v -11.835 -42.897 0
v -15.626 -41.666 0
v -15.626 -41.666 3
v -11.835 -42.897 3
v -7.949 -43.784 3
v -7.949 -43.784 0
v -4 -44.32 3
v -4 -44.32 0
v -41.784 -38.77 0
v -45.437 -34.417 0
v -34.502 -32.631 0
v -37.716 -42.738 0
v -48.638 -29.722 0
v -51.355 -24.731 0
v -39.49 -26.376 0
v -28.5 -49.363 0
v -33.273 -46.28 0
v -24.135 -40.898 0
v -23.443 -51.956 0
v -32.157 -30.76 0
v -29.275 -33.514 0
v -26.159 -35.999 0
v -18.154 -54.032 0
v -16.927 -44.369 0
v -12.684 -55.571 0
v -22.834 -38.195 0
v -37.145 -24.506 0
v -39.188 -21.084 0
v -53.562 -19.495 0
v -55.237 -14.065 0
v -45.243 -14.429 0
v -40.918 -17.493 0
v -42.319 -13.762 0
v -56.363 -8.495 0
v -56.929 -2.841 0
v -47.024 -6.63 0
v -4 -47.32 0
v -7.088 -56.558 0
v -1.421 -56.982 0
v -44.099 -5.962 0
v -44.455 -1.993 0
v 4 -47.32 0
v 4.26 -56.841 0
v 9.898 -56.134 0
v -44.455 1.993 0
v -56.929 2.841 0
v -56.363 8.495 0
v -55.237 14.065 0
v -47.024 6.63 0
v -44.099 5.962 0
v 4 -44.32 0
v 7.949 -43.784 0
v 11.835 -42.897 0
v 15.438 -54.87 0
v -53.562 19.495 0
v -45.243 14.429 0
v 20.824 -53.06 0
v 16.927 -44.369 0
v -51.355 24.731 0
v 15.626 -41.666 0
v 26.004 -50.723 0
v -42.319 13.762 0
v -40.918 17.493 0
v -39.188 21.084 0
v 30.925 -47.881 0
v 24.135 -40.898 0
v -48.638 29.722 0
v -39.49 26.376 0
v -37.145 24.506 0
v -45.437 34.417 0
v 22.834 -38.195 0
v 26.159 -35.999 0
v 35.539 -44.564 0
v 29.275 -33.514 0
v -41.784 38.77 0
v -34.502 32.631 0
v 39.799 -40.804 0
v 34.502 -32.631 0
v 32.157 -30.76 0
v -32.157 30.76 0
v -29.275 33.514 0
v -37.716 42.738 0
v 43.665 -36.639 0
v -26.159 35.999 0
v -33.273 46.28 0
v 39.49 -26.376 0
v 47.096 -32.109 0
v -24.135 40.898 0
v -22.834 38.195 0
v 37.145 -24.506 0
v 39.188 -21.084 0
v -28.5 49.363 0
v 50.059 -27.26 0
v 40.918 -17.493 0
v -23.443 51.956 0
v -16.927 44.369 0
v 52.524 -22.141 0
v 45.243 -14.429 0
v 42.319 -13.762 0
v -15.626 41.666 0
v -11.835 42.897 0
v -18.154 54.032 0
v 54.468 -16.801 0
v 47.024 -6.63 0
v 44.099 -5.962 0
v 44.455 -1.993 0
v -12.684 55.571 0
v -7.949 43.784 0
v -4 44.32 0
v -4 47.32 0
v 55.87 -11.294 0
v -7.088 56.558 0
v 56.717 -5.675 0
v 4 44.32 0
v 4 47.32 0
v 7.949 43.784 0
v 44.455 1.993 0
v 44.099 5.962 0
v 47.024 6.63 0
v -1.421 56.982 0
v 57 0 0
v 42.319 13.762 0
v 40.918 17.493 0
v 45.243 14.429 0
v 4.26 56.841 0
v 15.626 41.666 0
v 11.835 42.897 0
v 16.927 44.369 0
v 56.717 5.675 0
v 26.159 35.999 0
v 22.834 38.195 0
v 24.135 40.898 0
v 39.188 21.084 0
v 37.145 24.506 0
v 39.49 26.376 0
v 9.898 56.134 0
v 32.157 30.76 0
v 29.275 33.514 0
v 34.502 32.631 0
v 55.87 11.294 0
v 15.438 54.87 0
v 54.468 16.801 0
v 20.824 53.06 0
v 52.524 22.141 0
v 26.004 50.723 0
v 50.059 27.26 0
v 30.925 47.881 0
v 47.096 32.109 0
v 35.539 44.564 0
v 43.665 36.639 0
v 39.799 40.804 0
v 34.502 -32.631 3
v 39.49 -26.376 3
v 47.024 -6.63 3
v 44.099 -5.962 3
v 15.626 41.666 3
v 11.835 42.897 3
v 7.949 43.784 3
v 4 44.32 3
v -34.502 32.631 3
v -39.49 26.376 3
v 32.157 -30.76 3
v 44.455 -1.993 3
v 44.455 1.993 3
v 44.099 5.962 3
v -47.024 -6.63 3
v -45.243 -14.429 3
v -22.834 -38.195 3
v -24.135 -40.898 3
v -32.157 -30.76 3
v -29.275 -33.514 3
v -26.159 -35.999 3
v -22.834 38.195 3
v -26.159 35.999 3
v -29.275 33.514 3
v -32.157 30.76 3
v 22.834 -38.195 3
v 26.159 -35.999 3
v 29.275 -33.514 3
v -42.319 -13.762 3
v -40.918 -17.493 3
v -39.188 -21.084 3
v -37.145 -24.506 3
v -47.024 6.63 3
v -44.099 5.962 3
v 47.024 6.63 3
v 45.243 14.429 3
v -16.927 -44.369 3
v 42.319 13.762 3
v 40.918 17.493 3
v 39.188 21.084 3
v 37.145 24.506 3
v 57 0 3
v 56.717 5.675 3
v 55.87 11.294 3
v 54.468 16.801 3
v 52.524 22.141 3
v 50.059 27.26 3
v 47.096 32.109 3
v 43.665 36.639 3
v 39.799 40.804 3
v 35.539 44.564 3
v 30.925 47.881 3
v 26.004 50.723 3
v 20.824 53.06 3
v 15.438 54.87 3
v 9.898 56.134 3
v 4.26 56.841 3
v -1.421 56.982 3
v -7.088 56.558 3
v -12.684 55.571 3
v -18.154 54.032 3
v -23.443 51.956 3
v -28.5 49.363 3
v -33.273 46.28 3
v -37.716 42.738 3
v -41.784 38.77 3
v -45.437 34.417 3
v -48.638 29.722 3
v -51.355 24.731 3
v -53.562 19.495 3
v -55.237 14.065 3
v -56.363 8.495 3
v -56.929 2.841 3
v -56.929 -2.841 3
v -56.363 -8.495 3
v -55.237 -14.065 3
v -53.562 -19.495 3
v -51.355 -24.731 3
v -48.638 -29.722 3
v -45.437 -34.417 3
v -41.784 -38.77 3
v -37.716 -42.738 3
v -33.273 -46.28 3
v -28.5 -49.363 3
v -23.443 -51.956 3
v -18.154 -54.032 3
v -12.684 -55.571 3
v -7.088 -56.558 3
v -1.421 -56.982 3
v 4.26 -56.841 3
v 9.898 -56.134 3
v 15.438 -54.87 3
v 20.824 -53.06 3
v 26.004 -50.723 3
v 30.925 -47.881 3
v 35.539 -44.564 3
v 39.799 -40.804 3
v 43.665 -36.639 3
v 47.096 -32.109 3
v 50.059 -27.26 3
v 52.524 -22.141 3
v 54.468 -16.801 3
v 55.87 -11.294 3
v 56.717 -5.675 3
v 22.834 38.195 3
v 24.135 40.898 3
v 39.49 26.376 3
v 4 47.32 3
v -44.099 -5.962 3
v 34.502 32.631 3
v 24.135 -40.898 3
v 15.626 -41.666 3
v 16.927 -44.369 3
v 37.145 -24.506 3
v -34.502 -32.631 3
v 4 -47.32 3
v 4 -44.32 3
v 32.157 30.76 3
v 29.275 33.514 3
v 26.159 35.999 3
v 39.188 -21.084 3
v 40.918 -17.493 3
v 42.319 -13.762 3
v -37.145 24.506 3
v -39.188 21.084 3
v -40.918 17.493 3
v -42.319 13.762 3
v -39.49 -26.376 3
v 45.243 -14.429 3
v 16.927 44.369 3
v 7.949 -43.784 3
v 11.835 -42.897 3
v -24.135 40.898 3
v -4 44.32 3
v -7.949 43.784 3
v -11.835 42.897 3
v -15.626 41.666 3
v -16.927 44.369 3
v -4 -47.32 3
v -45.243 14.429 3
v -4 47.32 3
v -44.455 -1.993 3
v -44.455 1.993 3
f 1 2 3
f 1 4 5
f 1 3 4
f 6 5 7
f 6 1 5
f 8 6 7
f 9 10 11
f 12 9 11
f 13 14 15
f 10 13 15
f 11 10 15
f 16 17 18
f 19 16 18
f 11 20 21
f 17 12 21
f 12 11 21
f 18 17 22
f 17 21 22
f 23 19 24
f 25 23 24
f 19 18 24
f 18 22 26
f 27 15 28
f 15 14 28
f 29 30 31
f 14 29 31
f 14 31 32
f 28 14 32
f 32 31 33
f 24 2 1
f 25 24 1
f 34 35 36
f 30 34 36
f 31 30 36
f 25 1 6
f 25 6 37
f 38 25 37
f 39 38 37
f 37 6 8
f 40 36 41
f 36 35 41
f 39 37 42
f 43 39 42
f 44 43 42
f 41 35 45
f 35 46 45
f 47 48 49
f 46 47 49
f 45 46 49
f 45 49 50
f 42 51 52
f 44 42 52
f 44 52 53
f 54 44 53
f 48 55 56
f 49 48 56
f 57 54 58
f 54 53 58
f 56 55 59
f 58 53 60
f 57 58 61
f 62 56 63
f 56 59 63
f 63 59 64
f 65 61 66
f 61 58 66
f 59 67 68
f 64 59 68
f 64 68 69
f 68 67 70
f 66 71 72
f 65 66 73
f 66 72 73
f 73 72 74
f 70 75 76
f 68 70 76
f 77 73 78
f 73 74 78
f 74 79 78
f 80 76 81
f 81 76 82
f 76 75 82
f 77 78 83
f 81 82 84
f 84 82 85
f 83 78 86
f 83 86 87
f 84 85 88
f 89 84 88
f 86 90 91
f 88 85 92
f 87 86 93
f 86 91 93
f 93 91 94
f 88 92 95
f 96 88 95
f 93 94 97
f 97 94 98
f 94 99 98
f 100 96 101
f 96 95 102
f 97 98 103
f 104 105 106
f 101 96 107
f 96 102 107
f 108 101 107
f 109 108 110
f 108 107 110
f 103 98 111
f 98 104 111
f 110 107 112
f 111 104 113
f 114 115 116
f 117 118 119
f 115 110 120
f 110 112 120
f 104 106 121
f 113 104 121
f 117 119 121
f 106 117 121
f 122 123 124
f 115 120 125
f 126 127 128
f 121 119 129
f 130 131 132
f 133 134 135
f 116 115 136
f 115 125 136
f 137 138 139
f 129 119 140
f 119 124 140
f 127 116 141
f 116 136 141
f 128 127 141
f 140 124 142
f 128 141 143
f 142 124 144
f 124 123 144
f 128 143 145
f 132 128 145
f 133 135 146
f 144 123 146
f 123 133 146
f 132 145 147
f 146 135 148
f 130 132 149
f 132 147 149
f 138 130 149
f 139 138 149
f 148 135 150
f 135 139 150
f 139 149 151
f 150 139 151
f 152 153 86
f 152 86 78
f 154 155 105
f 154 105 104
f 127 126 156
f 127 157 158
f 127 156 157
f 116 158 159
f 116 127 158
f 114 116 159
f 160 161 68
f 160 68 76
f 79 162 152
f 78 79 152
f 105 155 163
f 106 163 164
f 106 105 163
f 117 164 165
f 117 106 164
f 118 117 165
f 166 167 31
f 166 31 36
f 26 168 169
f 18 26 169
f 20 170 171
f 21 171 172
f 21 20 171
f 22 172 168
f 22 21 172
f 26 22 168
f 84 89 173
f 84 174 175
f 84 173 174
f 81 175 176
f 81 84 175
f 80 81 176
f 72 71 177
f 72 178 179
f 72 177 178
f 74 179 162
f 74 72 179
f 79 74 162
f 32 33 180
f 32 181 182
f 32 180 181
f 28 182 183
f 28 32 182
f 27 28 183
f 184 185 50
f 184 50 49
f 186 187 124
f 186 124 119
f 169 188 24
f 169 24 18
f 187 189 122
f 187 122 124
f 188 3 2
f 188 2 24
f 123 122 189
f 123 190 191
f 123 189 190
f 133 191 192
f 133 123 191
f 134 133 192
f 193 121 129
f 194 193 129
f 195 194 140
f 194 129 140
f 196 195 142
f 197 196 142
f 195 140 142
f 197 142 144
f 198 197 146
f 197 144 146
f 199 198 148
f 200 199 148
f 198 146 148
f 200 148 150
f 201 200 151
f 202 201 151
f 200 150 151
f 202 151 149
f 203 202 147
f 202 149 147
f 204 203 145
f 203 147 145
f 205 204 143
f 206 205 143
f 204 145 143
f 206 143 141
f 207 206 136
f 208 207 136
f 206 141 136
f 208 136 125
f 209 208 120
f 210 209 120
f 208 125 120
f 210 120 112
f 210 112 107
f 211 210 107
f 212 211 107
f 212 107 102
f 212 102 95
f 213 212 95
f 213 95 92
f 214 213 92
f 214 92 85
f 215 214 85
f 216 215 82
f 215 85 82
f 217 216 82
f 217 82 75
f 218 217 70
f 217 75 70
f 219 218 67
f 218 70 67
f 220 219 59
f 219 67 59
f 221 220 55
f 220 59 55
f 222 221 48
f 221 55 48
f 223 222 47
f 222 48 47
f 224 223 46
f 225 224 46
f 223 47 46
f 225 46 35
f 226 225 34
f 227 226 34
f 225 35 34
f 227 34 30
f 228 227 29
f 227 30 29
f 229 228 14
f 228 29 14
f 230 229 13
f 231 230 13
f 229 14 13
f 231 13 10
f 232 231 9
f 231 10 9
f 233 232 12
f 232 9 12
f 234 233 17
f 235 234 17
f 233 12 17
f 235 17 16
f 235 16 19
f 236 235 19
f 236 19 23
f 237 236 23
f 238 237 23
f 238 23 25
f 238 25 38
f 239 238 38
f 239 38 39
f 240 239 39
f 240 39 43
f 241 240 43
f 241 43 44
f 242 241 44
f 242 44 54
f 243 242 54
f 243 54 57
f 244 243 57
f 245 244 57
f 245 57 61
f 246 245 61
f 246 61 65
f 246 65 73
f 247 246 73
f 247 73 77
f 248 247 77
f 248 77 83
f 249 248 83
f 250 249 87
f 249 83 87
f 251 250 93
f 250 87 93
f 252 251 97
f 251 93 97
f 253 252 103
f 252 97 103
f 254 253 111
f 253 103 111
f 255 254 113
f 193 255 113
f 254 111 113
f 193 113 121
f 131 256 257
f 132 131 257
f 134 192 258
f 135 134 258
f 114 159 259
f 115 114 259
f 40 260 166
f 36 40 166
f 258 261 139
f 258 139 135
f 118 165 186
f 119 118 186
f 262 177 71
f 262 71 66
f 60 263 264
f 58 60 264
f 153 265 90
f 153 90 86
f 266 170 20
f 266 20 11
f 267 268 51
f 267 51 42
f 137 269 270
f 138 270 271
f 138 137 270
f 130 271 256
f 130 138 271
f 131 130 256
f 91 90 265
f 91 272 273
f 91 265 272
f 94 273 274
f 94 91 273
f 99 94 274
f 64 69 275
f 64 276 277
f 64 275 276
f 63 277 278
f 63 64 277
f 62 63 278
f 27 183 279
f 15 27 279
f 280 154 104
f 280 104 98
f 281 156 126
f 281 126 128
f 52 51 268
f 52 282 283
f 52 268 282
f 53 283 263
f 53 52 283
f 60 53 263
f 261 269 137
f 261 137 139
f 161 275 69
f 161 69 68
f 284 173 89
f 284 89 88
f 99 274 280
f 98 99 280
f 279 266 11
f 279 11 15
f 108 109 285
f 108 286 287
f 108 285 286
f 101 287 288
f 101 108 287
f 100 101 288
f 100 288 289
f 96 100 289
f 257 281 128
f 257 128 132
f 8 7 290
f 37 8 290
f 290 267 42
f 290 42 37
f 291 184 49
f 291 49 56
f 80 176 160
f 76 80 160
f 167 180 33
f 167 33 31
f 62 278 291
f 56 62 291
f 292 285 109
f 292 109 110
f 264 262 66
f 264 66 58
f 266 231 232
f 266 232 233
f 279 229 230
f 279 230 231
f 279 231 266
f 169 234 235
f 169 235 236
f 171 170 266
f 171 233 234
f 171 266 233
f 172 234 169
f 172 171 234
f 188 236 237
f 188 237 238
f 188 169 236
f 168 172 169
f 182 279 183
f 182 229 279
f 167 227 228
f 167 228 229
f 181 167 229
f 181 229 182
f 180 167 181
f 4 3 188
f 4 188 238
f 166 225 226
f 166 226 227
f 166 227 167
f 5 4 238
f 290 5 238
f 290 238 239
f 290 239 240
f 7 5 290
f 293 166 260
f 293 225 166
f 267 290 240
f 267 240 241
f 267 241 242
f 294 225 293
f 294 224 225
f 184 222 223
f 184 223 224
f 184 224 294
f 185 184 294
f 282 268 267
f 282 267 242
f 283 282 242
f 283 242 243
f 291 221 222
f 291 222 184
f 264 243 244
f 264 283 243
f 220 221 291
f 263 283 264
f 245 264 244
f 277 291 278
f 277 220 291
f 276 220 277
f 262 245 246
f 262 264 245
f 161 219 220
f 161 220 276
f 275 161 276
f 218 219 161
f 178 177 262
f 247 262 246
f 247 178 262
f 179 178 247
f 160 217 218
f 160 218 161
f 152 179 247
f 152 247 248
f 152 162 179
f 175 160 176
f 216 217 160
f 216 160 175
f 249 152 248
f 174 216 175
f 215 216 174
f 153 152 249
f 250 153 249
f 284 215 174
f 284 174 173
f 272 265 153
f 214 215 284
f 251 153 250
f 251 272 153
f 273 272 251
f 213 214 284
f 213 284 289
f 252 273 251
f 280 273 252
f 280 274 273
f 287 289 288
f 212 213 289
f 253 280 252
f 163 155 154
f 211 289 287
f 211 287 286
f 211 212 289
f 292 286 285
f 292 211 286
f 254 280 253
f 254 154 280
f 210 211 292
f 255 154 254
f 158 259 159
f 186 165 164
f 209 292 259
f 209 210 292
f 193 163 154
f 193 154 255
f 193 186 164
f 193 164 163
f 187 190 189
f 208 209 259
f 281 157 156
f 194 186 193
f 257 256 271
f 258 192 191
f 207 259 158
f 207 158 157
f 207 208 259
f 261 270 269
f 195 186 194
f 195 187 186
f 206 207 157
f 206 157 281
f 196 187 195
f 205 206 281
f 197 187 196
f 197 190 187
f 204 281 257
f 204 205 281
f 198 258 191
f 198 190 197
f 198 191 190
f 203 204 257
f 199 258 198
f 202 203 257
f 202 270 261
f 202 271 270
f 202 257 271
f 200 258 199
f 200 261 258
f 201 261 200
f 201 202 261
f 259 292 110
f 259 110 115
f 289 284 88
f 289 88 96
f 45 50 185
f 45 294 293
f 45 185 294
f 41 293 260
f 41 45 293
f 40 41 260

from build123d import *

# Parameters (mm, degrees)
SKETCH1_R           = 57
SKETCH1_R_2         = 44.5
BOSS_EXTRUDE1_DEPTH = 3
CUT_EXTRUDE1_REACH  = 82.666
SKETCH3_W           = 8
SKETCH3_H           = 3
CIRPATTERN1_COUNT   = 14


with BuildPart() as part:
    # Sketch1 → Boss-Extrude1 (new body)
    with BuildSketch(Plane.XY):
        Circle(SKETCH1_R)
        Circle(SKETCH1_R_2, mode=Mode.SUBTRACT)
    extrude(amount=BOSS_EXTRUDE1_DEPTH)

    # Sketch3 → Cut-Extrude1 (cut, up to next)
    with BuildSketch(Plane.XY.offset(3), mode=Mode.PRIVATE) as cut_extrude1_sk1:
        with Locations((0, 45.819860108)):
            Rectangle(SKETCH3_W, SKETCH3_H)
    cut_extrude1_tool1 = extrude(cut_extrude1_sk1.sketch, amount=-CUT_EXTRUDE1_REACH, mode=Mode.PRIVATE) & part.part
    cut_extrude1 = cut_extrude1_tool1.solids().sort_by_distance((0, 45.81986, 3))[0]
    add(cut_extrude1, mode=Mode.SUBTRACT)

    # CirPattern1: Cut-Extrude1 ×14 about axis
    cirpattern1_axis = Axis((0, 0, 0), (0, 0, 1))
    for i in range(1, CIRPATTERN1_COUNT):
        add(cut_extrude1.rotate(cirpattern1_axis, i * 360 / CIRPATTERN1_COUNT), mode=Mode.SUBTRACT)


solid = part.part
